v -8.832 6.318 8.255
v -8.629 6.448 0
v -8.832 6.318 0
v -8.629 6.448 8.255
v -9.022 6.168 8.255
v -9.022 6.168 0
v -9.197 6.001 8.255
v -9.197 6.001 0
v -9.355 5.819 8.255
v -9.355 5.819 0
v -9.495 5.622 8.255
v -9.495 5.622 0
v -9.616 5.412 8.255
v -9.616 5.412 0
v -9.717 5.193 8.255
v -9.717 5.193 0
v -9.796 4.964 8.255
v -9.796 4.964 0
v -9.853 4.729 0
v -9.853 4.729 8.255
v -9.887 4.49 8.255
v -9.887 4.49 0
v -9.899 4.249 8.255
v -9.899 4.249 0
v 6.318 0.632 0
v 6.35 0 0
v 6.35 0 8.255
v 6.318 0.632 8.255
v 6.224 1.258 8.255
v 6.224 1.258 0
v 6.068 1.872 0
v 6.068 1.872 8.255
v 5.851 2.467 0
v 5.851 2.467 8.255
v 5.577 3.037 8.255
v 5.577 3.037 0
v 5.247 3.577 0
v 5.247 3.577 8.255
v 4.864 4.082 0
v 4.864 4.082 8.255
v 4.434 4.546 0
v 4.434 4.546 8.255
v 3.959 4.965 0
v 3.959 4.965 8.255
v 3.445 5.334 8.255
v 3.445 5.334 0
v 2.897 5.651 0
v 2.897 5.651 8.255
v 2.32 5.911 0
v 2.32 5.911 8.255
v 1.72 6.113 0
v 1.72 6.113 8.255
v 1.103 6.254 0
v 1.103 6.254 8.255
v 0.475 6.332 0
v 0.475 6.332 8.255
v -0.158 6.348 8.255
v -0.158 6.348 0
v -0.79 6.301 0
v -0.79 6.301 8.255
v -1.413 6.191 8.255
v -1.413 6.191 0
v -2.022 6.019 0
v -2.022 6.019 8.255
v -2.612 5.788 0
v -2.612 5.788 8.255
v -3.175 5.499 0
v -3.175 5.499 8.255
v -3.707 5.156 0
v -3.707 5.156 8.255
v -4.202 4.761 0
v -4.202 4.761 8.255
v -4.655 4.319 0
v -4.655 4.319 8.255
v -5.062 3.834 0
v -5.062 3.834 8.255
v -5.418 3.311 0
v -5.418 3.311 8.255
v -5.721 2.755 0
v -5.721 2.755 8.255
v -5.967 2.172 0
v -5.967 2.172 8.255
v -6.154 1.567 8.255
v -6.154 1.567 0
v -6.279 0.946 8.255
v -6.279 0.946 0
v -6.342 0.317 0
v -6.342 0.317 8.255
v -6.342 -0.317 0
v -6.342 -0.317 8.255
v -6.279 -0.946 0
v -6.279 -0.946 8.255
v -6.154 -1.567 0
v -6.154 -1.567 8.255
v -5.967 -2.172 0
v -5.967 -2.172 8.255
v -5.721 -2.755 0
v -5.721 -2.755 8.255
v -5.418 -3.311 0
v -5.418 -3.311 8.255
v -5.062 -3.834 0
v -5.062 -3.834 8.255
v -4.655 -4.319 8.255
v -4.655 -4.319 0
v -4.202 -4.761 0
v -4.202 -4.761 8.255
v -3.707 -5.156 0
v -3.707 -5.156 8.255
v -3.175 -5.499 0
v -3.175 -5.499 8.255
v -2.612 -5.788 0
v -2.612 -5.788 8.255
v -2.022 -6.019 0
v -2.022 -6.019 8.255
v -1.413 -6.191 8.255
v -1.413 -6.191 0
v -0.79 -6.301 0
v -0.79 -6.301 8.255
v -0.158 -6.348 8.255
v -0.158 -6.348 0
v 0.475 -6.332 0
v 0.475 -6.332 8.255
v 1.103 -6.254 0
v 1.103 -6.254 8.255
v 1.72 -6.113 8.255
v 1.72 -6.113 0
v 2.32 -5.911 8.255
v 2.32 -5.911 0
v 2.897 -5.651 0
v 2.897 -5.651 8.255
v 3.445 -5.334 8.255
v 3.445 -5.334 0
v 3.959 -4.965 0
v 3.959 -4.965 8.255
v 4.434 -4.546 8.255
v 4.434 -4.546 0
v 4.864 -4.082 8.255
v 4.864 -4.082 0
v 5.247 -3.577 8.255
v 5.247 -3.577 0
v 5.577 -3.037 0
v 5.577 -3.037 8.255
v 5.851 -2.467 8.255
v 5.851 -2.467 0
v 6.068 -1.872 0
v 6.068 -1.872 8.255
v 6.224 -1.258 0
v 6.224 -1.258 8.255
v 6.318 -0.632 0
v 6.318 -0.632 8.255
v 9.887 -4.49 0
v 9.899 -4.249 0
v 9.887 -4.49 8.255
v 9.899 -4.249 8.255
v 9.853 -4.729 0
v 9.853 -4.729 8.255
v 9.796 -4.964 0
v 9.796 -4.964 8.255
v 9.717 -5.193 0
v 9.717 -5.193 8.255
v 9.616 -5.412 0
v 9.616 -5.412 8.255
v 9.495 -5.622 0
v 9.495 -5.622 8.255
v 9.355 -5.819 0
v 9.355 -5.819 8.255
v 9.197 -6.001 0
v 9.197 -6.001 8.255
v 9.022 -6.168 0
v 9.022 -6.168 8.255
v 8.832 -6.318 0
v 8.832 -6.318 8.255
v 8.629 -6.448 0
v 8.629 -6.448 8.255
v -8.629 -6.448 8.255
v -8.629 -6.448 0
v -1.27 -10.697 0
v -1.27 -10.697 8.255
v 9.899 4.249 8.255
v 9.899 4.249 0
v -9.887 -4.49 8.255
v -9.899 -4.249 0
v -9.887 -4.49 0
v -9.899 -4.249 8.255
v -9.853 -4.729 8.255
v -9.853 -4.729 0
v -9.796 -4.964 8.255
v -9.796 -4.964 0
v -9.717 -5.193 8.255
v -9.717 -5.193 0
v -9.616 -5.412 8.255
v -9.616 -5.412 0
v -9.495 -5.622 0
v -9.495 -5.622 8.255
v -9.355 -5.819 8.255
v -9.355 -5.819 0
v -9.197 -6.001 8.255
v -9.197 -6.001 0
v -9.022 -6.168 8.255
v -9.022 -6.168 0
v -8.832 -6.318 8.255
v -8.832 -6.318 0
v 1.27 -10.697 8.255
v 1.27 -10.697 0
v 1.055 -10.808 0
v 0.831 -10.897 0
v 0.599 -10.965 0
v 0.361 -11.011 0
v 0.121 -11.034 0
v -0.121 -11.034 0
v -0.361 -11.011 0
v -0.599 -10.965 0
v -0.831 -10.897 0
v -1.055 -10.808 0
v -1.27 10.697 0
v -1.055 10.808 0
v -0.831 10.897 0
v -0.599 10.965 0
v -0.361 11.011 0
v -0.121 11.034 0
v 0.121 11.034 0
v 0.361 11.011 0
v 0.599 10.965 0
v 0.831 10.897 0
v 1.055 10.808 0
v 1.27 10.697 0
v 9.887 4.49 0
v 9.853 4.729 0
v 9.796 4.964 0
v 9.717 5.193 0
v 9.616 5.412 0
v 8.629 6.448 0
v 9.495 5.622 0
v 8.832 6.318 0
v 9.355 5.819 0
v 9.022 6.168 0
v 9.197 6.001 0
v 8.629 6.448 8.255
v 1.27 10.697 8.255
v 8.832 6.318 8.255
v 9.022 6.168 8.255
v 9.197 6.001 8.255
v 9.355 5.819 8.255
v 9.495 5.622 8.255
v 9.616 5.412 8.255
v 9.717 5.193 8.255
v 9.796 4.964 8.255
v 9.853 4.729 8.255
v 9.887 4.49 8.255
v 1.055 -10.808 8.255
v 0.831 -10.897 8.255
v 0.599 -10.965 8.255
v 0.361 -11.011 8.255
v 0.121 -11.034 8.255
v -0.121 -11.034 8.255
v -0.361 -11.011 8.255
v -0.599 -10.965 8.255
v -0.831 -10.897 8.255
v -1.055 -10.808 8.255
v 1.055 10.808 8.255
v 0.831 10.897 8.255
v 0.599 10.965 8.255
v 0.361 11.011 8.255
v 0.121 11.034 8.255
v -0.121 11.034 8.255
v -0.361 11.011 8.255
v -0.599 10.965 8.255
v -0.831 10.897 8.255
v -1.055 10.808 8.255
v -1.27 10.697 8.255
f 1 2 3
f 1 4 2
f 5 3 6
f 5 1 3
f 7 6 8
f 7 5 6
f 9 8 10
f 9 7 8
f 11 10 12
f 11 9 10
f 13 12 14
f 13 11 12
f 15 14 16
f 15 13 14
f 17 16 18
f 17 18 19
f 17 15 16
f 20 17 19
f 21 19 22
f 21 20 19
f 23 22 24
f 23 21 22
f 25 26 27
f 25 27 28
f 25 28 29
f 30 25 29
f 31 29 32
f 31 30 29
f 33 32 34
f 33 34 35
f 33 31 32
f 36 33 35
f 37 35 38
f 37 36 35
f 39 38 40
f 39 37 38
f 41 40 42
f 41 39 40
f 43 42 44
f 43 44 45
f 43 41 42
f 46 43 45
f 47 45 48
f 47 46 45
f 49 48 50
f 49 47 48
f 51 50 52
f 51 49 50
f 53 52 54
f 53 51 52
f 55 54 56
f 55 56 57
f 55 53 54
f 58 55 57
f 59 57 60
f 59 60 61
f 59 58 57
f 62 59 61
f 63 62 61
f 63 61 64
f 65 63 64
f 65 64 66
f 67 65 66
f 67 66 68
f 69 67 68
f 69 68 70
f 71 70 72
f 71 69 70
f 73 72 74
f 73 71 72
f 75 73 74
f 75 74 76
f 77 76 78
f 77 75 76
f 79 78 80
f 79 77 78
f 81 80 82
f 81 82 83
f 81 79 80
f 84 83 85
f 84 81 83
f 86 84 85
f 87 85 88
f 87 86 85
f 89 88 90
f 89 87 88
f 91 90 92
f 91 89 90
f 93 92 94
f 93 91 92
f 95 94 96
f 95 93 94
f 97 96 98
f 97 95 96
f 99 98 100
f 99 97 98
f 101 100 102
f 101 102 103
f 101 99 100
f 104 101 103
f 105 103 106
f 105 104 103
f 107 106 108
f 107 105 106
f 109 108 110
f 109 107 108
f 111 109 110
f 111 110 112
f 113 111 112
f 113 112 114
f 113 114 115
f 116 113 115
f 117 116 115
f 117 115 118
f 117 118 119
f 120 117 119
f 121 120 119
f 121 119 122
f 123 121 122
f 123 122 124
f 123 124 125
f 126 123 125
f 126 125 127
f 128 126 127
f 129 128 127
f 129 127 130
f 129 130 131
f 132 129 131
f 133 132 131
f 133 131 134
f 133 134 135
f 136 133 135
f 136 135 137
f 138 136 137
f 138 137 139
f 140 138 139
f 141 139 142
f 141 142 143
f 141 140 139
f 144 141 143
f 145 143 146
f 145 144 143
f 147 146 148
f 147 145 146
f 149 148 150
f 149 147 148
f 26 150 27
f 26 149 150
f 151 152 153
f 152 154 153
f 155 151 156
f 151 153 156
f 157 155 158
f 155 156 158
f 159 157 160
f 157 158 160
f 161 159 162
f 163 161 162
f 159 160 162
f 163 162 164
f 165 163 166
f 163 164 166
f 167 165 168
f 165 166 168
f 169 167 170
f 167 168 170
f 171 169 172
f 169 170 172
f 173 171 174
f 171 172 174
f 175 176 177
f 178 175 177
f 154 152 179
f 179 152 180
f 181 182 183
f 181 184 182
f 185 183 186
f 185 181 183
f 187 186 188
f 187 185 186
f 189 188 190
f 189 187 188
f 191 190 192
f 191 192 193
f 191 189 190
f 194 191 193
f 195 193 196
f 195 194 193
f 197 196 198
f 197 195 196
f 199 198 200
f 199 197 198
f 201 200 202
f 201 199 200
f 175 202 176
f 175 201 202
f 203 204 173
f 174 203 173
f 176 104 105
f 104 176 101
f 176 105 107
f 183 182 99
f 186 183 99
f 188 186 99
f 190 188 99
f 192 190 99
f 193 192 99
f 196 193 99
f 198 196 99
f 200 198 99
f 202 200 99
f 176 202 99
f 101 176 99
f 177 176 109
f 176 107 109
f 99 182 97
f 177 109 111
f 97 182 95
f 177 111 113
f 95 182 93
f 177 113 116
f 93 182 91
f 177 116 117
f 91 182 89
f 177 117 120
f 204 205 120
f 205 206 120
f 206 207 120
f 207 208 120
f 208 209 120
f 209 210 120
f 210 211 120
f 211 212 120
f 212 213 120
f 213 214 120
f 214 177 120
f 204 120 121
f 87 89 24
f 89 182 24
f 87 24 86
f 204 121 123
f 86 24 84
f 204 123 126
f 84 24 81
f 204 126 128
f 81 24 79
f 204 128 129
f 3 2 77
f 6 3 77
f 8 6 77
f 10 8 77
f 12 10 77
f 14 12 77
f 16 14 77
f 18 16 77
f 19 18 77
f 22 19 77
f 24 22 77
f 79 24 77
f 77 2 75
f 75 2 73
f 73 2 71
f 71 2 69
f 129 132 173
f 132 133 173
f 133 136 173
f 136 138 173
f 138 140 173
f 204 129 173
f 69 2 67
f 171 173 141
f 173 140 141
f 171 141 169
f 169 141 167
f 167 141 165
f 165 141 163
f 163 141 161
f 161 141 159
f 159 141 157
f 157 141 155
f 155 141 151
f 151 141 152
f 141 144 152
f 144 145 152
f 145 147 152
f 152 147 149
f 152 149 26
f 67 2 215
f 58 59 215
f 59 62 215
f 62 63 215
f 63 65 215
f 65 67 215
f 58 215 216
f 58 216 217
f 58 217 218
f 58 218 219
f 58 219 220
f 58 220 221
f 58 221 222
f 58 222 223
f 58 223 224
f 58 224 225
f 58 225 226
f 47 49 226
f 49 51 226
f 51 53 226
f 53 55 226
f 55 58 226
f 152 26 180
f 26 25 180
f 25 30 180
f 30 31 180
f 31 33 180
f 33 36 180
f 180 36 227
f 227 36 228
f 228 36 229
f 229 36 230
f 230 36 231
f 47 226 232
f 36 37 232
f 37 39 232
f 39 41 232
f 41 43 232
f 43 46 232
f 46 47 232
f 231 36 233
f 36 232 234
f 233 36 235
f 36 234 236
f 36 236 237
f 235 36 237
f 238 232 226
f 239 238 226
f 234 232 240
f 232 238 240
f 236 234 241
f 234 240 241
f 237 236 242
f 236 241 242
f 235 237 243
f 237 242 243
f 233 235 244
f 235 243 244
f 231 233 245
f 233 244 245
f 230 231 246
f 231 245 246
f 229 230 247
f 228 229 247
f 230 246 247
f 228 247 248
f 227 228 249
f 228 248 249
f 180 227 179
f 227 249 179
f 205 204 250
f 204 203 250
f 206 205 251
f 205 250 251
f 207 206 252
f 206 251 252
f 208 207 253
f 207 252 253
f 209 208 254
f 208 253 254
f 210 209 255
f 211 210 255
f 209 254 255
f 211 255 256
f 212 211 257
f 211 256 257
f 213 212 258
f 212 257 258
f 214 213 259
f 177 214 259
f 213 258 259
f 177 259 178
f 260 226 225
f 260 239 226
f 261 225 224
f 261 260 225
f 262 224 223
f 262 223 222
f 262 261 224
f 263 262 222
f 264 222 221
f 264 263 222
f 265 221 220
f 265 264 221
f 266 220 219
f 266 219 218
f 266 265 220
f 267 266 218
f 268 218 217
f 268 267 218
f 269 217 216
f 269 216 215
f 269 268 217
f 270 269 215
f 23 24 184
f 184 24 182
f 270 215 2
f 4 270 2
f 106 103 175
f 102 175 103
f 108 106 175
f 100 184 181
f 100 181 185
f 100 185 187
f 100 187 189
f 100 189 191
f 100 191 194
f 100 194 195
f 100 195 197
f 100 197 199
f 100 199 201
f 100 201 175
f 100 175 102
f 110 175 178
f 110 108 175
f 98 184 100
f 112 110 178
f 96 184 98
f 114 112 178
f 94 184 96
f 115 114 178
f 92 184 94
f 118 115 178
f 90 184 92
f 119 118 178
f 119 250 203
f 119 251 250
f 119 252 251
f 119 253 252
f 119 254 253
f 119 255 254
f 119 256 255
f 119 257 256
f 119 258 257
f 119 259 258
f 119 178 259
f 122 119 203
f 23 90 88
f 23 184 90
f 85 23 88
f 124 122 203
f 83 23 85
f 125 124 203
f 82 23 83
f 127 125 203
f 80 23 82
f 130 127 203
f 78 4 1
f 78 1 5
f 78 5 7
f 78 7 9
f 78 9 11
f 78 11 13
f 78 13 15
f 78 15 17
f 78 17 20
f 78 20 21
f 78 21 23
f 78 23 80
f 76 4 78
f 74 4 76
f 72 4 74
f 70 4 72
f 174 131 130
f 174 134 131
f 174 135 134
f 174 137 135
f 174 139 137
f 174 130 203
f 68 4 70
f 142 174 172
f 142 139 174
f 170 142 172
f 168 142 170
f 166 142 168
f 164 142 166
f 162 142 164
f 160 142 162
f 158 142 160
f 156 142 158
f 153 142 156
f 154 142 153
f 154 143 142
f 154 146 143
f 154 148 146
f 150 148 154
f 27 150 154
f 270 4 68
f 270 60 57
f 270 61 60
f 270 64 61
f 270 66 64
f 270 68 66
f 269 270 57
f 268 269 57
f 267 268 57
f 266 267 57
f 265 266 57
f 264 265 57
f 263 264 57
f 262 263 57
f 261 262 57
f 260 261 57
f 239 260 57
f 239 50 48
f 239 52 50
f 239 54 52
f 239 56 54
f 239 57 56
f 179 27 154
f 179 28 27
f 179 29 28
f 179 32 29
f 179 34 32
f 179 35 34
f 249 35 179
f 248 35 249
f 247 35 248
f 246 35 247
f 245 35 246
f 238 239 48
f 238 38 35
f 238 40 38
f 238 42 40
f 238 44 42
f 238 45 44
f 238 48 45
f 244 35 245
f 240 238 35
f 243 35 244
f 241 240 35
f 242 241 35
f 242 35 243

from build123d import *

# Parameters (mm, degrees)
F0_R     = 6.35
F1_DEPTH = 8.255
F2_R     = 2.54


with BuildPart() as f1:
    # F0 (on Top) → F1 (new body)
    with BuildSketch(Plane.XY):
        Polygon((9.89867, 5.715), (0, 11.43), (-9.89867, 5.715), (-9.89867, -5.715), (0, -11.43), (9.89867, -5.715), align=None)
        Circle(F0_R, mode=Mode.SUBTRACT)
    extrude(amount=F1_DEPTH)

    # F2
    f2_edges = [f1.edges().sort_by_distance(p)[0] for p in [
        (-9.89867, -5.715, 4.1275),
        (0, -11.43, 4.1275),
        (9.89867, -5.715, 4.1275),
        (9.89867, 5.715, 4.1275),
        (0, 11.43, 4.1275),
        (-9.89867, 5.715, 4.1275),
    ]]
    fillet(f2_edges, radius=F2_R)


solid = f1.part
